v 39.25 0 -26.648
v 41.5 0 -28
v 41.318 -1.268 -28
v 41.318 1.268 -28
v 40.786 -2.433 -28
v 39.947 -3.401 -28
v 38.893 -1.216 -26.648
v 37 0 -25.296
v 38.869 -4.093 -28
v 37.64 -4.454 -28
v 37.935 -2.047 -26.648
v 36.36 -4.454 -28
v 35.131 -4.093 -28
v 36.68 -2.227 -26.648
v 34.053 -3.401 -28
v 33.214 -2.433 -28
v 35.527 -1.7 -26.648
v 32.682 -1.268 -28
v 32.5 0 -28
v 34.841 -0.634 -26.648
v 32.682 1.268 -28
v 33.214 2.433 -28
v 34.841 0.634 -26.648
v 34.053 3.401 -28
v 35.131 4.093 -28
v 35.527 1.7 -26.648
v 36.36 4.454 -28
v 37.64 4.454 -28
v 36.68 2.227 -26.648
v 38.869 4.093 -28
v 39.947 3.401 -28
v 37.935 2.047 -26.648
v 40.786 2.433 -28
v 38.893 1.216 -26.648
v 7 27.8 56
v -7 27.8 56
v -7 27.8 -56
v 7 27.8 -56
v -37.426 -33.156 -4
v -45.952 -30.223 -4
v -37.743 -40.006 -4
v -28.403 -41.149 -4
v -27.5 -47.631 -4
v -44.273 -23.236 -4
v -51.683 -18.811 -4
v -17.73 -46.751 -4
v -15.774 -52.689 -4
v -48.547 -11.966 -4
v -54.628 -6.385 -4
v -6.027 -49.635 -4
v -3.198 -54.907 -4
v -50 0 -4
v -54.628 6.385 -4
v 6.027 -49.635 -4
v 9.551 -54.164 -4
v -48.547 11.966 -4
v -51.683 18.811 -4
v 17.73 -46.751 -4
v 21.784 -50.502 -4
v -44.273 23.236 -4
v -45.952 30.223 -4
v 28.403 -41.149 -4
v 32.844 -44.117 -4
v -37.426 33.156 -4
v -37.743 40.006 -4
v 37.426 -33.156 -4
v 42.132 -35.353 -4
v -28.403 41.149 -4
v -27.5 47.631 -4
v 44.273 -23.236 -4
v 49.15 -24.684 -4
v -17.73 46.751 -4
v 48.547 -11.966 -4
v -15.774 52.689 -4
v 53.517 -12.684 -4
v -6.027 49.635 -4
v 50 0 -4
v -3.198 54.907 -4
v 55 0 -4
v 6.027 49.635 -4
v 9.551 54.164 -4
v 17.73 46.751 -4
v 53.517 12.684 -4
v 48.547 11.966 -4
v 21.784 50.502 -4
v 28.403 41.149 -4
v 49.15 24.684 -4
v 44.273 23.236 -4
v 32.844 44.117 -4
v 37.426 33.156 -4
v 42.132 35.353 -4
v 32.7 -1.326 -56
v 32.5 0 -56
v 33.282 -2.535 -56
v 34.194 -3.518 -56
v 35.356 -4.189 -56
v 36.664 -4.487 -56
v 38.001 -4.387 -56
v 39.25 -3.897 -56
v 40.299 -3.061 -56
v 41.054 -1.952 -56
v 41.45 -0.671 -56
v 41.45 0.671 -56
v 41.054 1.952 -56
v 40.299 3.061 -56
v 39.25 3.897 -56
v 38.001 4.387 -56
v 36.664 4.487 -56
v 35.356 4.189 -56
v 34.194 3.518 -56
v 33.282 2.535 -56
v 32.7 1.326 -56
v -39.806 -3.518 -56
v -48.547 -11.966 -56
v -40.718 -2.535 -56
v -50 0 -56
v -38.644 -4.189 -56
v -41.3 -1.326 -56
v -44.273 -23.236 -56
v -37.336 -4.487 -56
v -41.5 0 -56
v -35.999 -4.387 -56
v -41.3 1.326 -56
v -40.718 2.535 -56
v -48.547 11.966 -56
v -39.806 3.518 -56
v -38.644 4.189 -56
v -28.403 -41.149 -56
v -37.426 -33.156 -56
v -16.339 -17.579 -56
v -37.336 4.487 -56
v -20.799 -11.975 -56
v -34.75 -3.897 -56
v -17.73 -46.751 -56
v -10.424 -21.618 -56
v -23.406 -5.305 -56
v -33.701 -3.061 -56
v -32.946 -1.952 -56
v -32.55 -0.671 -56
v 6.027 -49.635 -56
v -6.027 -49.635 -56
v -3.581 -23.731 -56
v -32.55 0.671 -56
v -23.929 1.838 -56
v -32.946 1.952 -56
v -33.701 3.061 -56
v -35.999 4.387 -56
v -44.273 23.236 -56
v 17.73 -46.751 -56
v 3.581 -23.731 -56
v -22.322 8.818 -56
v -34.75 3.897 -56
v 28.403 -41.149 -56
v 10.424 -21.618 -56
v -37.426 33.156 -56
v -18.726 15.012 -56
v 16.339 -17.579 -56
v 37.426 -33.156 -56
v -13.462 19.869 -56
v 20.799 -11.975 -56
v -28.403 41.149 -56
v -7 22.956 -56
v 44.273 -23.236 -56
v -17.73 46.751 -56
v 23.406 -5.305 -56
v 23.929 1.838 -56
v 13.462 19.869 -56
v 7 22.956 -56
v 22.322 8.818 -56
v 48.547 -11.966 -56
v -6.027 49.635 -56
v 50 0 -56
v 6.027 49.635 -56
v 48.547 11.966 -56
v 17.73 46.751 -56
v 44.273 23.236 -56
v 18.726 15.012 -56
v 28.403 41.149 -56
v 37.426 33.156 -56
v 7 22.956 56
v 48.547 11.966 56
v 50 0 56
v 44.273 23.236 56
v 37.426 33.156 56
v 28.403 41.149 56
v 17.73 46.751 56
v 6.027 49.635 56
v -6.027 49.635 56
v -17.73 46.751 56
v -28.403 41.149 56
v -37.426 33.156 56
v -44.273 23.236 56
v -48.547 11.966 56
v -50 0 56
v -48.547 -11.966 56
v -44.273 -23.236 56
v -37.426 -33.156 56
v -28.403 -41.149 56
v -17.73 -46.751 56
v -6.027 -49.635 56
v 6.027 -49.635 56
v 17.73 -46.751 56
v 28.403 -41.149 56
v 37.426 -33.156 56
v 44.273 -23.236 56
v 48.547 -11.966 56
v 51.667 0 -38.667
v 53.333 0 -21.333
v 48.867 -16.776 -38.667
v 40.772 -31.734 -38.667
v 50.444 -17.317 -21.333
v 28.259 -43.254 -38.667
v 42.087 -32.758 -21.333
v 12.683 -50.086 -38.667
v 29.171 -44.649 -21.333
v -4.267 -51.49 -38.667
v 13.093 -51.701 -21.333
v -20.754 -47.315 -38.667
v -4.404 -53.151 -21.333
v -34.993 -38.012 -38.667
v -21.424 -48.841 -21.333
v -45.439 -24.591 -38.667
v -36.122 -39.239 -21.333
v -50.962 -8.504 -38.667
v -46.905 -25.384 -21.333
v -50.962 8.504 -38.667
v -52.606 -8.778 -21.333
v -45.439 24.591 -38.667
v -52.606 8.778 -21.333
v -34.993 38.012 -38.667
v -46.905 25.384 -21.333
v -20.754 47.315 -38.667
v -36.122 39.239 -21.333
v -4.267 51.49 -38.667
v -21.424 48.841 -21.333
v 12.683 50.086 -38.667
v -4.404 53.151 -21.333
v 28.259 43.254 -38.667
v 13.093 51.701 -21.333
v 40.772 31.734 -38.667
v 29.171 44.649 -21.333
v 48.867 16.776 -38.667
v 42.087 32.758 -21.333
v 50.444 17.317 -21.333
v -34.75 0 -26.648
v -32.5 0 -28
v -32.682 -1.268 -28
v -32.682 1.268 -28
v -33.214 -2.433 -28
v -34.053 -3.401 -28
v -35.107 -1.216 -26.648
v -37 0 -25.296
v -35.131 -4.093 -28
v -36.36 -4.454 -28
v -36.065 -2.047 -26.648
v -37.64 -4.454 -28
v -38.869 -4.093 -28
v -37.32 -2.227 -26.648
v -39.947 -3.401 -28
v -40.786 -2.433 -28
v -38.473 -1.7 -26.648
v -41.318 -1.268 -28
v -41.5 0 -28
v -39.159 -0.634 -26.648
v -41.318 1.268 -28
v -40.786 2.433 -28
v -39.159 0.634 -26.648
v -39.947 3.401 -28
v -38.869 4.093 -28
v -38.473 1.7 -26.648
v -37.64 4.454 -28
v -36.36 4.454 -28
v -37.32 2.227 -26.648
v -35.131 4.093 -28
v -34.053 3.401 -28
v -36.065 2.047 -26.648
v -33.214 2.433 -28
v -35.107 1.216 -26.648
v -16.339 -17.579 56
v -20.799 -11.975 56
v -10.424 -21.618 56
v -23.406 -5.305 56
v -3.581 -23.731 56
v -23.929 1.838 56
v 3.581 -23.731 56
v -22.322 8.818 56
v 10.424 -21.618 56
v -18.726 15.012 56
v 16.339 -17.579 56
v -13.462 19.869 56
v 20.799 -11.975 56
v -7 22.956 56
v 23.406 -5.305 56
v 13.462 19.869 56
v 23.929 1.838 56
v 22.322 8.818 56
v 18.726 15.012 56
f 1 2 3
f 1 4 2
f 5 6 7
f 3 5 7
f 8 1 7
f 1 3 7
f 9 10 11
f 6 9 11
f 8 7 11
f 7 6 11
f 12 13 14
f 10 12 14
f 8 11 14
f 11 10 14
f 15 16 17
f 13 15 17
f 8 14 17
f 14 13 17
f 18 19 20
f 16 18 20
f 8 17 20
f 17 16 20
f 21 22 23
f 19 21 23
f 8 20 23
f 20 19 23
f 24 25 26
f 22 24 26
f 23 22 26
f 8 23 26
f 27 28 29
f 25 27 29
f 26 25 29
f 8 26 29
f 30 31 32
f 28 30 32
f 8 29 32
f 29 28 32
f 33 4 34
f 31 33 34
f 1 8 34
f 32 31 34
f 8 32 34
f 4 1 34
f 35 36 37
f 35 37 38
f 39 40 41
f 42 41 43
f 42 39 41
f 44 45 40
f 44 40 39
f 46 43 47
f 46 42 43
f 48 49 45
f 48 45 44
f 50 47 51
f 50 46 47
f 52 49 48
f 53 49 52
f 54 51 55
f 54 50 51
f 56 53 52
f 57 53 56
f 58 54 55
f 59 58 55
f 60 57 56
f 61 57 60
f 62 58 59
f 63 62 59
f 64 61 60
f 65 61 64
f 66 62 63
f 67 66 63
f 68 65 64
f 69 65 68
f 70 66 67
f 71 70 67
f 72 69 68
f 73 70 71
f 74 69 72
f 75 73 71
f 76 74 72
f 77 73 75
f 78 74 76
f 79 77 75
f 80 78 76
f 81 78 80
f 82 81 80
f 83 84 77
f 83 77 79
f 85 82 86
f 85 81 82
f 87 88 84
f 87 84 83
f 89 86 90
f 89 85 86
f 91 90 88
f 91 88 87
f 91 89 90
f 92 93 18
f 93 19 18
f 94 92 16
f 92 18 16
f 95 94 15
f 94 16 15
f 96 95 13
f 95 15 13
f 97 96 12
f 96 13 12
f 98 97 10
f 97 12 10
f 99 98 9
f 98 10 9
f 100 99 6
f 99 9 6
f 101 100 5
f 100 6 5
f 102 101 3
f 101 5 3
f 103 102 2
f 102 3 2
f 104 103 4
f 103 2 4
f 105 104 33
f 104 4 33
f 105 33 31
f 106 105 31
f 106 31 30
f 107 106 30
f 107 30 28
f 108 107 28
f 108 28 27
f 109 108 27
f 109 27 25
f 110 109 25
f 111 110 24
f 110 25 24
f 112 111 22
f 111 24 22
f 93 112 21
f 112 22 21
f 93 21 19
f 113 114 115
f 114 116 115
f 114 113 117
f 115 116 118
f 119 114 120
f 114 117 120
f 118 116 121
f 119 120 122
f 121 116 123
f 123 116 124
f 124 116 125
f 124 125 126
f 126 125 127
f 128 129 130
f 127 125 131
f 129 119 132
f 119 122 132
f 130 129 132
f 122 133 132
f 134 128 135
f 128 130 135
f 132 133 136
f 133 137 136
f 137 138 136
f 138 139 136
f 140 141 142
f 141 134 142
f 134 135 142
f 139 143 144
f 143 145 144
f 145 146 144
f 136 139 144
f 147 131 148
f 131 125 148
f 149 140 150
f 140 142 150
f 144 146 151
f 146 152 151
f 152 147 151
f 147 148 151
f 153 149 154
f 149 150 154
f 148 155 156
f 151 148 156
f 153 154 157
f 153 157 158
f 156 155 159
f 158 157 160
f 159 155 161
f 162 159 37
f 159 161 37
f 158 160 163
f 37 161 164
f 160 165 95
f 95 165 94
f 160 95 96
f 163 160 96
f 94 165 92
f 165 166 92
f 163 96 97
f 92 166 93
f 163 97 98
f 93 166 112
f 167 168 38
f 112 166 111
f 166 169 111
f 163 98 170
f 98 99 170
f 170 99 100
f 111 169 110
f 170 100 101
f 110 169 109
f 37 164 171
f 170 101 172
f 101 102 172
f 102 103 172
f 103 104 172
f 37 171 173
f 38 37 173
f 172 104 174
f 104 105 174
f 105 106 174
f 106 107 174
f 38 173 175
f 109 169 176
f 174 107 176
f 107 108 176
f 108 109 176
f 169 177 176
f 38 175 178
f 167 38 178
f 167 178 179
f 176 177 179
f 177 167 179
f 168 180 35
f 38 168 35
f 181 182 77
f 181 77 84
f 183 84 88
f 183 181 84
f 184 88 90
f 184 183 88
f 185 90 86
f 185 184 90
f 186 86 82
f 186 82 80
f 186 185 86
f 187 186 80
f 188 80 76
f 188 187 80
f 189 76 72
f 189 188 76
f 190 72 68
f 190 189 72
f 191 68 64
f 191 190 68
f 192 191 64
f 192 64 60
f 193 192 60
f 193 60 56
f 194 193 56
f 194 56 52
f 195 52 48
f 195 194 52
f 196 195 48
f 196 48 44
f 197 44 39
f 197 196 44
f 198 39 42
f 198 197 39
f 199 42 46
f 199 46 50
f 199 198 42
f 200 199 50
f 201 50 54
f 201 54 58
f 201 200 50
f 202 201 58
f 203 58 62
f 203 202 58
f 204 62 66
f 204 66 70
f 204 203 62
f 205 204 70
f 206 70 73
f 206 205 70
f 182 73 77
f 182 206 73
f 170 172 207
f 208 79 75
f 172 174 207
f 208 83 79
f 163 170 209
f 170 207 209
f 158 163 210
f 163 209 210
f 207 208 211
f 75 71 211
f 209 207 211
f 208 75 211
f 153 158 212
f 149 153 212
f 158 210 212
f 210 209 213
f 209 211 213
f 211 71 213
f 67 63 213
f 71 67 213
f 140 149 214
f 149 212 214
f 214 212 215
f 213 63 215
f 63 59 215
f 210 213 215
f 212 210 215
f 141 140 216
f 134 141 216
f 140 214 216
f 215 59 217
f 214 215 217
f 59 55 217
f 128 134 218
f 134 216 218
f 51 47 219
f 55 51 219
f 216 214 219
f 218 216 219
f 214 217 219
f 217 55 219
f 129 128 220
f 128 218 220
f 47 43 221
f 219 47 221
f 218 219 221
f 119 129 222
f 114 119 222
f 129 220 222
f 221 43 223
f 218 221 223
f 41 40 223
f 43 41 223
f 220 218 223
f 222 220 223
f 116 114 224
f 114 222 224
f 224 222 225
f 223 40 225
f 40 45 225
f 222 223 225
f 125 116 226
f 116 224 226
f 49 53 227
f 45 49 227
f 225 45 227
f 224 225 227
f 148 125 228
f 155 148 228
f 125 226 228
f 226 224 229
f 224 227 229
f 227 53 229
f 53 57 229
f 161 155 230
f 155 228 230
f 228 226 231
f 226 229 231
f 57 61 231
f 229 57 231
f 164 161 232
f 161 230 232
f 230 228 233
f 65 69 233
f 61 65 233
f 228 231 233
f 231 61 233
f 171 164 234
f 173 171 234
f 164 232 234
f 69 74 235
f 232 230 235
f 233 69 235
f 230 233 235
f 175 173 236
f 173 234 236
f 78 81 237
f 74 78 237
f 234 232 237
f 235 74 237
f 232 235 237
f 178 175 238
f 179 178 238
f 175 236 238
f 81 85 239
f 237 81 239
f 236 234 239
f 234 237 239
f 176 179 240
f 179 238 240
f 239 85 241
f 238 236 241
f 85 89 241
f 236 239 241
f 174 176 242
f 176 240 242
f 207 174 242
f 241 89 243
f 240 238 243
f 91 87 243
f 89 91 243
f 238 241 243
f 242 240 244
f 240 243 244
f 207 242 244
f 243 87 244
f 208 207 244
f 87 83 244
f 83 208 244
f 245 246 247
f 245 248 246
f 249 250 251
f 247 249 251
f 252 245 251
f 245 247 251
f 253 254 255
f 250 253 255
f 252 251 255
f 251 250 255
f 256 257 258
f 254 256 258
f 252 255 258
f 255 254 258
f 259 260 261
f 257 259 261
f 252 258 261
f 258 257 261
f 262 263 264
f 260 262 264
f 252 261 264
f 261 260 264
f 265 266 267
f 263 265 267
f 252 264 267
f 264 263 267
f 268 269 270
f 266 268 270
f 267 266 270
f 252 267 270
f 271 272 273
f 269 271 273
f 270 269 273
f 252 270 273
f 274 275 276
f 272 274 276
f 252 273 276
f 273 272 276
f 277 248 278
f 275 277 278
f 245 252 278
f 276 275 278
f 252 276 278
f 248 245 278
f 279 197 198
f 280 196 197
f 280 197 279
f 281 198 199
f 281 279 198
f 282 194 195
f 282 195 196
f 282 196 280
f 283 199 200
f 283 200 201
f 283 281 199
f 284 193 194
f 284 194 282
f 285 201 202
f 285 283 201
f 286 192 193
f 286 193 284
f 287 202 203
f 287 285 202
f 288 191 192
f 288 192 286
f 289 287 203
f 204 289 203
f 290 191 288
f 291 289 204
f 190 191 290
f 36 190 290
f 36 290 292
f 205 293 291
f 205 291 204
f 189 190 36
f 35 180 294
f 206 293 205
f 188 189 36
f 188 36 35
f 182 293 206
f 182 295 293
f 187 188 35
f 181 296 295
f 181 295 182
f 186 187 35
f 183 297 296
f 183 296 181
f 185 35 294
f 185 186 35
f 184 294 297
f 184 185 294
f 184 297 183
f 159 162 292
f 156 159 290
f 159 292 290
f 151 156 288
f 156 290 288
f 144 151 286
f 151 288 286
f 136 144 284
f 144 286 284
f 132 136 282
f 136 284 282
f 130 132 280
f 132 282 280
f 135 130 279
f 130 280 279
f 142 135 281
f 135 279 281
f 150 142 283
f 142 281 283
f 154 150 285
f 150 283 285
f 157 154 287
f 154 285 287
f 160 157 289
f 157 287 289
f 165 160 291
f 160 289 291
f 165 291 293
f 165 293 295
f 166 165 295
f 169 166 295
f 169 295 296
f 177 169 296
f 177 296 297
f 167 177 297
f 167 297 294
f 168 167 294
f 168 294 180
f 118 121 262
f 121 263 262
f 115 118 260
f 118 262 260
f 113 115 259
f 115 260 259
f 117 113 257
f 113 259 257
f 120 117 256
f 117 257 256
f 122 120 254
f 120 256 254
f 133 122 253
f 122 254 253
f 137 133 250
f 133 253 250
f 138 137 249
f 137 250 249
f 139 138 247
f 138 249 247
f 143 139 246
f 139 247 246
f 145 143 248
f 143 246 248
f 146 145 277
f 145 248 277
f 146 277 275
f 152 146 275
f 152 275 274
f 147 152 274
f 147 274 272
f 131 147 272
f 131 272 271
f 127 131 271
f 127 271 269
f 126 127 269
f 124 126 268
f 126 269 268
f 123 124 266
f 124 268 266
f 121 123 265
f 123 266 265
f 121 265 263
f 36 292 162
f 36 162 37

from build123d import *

# Parameters (mm, degrees)
SKETCH1_R                  = 55
BOSS_EXTRUDE1_DEPTH        = 56
SKETCH2_R                  = 24
CUT_EXTRUDE1_DEPTH         = 112
SKETCH3_W                  = 14
SKETCH3_H                  = 7.6
CUT_EXTRUDE2_DEPTH         = 137.359818128
SKETCH4_OUTSIDE_W          = 150.338
SKETCH4_OUTSIDE_H          = 150.338
SKETCH4_OUTSIDE_R          = 50
CUT_EXTRUDE3_DEPTH         = 60
M10X1_0_TAPPED_HOLE1_D     = 9
M10X1_0_TAPPED_HOLE1_DEPTH = 28
M10X1_0_TAPPED_HOLE1_TIP   = 2.703872786


with BuildPart() as part:
    # Sketch1 → Boss-Extrude1 (new, symmetric)
    with BuildSketch(Plane.XY):
        Circle(SKETCH1_R)
    extrude(amount=BOSS_EXTRUDE1_DEPTH, both=True)

    # Sketch2 → Cut-Extrude1 (cut)
    with BuildSketch(Plane.XY.offset(56)):
        Circle(SKETCH2_R)
    extrude(amount=-CUT_EXTRUDE1_DEPTH, mode=Mode.SUBTRACT)

    # Sketch3 → Cut-Extrude2 (cut, through all)
    with BuildSketch(Plane.XY.offset(56)):
        with Locations((0, 24)):
            Rectangle(SKETCH3_W, SKETCH3_H)
    extrude(amount=-CUT_EXTRUDE2_DEPTH, mode=Mode.SUBTRACT)

    # Sketch4 outside → Cut-Extrude3 (cut)
    with BuildSketch(Plane.XY.offset(56)):
        Rectangle(SKETCH4_OUTSIDE_W, SKETCH4_OUTSIDE_H)
        Circle(SKETCH4_OUTSIDE_R, mode=Mode.SUBTRACT)
    extrude(amount=-CUT_EXTRUDE3_DEPTH, mode=Mode.SUBTRACT)

    # Sketch5 → Cut-Revolve1 (revolve, cut)
    with BuildSketch(Plane(origin=(0, 0, 0), x_dir=(1, 0, 0), z_dir=(0, 1, 0))):
        Polygon((50, 56), (55, 4), (55, 56), align=None)
    revolve(axis=Axis((0, 0, 0), (0, 0, -1)), mode=Mode.SUBTRACT)

    # M10x1.0 Tapped Hole1
    with Locations(Plane(origin=(-4.867734964, -29.256831772, -56), x_dir=(1, 0, 0), z_dir=(0, 0, -1))):
        with Locations((41.867734964, -29.256831772), (-32.132265036, -29.256831772)):
            Hole(M10X1_0_TAPPED_HOLE1_D / 2, depth=M10X1_0_TAPPED_HOLE1_DEPTH)
            with Locations((0, 0, -(M10X1_0_TAPPED_HOLE1_DEPTH + M10X1_0_TAPPED_HOLE1_TIP / 2))):  # 118° drill point
                Cone(0, M10X1_0_TAPPED_HOLE1_D / 2, M10X1_0_TAPPED_HOLE1_TIP, mode=Mode.SUBTRACT)


solid = part.part
